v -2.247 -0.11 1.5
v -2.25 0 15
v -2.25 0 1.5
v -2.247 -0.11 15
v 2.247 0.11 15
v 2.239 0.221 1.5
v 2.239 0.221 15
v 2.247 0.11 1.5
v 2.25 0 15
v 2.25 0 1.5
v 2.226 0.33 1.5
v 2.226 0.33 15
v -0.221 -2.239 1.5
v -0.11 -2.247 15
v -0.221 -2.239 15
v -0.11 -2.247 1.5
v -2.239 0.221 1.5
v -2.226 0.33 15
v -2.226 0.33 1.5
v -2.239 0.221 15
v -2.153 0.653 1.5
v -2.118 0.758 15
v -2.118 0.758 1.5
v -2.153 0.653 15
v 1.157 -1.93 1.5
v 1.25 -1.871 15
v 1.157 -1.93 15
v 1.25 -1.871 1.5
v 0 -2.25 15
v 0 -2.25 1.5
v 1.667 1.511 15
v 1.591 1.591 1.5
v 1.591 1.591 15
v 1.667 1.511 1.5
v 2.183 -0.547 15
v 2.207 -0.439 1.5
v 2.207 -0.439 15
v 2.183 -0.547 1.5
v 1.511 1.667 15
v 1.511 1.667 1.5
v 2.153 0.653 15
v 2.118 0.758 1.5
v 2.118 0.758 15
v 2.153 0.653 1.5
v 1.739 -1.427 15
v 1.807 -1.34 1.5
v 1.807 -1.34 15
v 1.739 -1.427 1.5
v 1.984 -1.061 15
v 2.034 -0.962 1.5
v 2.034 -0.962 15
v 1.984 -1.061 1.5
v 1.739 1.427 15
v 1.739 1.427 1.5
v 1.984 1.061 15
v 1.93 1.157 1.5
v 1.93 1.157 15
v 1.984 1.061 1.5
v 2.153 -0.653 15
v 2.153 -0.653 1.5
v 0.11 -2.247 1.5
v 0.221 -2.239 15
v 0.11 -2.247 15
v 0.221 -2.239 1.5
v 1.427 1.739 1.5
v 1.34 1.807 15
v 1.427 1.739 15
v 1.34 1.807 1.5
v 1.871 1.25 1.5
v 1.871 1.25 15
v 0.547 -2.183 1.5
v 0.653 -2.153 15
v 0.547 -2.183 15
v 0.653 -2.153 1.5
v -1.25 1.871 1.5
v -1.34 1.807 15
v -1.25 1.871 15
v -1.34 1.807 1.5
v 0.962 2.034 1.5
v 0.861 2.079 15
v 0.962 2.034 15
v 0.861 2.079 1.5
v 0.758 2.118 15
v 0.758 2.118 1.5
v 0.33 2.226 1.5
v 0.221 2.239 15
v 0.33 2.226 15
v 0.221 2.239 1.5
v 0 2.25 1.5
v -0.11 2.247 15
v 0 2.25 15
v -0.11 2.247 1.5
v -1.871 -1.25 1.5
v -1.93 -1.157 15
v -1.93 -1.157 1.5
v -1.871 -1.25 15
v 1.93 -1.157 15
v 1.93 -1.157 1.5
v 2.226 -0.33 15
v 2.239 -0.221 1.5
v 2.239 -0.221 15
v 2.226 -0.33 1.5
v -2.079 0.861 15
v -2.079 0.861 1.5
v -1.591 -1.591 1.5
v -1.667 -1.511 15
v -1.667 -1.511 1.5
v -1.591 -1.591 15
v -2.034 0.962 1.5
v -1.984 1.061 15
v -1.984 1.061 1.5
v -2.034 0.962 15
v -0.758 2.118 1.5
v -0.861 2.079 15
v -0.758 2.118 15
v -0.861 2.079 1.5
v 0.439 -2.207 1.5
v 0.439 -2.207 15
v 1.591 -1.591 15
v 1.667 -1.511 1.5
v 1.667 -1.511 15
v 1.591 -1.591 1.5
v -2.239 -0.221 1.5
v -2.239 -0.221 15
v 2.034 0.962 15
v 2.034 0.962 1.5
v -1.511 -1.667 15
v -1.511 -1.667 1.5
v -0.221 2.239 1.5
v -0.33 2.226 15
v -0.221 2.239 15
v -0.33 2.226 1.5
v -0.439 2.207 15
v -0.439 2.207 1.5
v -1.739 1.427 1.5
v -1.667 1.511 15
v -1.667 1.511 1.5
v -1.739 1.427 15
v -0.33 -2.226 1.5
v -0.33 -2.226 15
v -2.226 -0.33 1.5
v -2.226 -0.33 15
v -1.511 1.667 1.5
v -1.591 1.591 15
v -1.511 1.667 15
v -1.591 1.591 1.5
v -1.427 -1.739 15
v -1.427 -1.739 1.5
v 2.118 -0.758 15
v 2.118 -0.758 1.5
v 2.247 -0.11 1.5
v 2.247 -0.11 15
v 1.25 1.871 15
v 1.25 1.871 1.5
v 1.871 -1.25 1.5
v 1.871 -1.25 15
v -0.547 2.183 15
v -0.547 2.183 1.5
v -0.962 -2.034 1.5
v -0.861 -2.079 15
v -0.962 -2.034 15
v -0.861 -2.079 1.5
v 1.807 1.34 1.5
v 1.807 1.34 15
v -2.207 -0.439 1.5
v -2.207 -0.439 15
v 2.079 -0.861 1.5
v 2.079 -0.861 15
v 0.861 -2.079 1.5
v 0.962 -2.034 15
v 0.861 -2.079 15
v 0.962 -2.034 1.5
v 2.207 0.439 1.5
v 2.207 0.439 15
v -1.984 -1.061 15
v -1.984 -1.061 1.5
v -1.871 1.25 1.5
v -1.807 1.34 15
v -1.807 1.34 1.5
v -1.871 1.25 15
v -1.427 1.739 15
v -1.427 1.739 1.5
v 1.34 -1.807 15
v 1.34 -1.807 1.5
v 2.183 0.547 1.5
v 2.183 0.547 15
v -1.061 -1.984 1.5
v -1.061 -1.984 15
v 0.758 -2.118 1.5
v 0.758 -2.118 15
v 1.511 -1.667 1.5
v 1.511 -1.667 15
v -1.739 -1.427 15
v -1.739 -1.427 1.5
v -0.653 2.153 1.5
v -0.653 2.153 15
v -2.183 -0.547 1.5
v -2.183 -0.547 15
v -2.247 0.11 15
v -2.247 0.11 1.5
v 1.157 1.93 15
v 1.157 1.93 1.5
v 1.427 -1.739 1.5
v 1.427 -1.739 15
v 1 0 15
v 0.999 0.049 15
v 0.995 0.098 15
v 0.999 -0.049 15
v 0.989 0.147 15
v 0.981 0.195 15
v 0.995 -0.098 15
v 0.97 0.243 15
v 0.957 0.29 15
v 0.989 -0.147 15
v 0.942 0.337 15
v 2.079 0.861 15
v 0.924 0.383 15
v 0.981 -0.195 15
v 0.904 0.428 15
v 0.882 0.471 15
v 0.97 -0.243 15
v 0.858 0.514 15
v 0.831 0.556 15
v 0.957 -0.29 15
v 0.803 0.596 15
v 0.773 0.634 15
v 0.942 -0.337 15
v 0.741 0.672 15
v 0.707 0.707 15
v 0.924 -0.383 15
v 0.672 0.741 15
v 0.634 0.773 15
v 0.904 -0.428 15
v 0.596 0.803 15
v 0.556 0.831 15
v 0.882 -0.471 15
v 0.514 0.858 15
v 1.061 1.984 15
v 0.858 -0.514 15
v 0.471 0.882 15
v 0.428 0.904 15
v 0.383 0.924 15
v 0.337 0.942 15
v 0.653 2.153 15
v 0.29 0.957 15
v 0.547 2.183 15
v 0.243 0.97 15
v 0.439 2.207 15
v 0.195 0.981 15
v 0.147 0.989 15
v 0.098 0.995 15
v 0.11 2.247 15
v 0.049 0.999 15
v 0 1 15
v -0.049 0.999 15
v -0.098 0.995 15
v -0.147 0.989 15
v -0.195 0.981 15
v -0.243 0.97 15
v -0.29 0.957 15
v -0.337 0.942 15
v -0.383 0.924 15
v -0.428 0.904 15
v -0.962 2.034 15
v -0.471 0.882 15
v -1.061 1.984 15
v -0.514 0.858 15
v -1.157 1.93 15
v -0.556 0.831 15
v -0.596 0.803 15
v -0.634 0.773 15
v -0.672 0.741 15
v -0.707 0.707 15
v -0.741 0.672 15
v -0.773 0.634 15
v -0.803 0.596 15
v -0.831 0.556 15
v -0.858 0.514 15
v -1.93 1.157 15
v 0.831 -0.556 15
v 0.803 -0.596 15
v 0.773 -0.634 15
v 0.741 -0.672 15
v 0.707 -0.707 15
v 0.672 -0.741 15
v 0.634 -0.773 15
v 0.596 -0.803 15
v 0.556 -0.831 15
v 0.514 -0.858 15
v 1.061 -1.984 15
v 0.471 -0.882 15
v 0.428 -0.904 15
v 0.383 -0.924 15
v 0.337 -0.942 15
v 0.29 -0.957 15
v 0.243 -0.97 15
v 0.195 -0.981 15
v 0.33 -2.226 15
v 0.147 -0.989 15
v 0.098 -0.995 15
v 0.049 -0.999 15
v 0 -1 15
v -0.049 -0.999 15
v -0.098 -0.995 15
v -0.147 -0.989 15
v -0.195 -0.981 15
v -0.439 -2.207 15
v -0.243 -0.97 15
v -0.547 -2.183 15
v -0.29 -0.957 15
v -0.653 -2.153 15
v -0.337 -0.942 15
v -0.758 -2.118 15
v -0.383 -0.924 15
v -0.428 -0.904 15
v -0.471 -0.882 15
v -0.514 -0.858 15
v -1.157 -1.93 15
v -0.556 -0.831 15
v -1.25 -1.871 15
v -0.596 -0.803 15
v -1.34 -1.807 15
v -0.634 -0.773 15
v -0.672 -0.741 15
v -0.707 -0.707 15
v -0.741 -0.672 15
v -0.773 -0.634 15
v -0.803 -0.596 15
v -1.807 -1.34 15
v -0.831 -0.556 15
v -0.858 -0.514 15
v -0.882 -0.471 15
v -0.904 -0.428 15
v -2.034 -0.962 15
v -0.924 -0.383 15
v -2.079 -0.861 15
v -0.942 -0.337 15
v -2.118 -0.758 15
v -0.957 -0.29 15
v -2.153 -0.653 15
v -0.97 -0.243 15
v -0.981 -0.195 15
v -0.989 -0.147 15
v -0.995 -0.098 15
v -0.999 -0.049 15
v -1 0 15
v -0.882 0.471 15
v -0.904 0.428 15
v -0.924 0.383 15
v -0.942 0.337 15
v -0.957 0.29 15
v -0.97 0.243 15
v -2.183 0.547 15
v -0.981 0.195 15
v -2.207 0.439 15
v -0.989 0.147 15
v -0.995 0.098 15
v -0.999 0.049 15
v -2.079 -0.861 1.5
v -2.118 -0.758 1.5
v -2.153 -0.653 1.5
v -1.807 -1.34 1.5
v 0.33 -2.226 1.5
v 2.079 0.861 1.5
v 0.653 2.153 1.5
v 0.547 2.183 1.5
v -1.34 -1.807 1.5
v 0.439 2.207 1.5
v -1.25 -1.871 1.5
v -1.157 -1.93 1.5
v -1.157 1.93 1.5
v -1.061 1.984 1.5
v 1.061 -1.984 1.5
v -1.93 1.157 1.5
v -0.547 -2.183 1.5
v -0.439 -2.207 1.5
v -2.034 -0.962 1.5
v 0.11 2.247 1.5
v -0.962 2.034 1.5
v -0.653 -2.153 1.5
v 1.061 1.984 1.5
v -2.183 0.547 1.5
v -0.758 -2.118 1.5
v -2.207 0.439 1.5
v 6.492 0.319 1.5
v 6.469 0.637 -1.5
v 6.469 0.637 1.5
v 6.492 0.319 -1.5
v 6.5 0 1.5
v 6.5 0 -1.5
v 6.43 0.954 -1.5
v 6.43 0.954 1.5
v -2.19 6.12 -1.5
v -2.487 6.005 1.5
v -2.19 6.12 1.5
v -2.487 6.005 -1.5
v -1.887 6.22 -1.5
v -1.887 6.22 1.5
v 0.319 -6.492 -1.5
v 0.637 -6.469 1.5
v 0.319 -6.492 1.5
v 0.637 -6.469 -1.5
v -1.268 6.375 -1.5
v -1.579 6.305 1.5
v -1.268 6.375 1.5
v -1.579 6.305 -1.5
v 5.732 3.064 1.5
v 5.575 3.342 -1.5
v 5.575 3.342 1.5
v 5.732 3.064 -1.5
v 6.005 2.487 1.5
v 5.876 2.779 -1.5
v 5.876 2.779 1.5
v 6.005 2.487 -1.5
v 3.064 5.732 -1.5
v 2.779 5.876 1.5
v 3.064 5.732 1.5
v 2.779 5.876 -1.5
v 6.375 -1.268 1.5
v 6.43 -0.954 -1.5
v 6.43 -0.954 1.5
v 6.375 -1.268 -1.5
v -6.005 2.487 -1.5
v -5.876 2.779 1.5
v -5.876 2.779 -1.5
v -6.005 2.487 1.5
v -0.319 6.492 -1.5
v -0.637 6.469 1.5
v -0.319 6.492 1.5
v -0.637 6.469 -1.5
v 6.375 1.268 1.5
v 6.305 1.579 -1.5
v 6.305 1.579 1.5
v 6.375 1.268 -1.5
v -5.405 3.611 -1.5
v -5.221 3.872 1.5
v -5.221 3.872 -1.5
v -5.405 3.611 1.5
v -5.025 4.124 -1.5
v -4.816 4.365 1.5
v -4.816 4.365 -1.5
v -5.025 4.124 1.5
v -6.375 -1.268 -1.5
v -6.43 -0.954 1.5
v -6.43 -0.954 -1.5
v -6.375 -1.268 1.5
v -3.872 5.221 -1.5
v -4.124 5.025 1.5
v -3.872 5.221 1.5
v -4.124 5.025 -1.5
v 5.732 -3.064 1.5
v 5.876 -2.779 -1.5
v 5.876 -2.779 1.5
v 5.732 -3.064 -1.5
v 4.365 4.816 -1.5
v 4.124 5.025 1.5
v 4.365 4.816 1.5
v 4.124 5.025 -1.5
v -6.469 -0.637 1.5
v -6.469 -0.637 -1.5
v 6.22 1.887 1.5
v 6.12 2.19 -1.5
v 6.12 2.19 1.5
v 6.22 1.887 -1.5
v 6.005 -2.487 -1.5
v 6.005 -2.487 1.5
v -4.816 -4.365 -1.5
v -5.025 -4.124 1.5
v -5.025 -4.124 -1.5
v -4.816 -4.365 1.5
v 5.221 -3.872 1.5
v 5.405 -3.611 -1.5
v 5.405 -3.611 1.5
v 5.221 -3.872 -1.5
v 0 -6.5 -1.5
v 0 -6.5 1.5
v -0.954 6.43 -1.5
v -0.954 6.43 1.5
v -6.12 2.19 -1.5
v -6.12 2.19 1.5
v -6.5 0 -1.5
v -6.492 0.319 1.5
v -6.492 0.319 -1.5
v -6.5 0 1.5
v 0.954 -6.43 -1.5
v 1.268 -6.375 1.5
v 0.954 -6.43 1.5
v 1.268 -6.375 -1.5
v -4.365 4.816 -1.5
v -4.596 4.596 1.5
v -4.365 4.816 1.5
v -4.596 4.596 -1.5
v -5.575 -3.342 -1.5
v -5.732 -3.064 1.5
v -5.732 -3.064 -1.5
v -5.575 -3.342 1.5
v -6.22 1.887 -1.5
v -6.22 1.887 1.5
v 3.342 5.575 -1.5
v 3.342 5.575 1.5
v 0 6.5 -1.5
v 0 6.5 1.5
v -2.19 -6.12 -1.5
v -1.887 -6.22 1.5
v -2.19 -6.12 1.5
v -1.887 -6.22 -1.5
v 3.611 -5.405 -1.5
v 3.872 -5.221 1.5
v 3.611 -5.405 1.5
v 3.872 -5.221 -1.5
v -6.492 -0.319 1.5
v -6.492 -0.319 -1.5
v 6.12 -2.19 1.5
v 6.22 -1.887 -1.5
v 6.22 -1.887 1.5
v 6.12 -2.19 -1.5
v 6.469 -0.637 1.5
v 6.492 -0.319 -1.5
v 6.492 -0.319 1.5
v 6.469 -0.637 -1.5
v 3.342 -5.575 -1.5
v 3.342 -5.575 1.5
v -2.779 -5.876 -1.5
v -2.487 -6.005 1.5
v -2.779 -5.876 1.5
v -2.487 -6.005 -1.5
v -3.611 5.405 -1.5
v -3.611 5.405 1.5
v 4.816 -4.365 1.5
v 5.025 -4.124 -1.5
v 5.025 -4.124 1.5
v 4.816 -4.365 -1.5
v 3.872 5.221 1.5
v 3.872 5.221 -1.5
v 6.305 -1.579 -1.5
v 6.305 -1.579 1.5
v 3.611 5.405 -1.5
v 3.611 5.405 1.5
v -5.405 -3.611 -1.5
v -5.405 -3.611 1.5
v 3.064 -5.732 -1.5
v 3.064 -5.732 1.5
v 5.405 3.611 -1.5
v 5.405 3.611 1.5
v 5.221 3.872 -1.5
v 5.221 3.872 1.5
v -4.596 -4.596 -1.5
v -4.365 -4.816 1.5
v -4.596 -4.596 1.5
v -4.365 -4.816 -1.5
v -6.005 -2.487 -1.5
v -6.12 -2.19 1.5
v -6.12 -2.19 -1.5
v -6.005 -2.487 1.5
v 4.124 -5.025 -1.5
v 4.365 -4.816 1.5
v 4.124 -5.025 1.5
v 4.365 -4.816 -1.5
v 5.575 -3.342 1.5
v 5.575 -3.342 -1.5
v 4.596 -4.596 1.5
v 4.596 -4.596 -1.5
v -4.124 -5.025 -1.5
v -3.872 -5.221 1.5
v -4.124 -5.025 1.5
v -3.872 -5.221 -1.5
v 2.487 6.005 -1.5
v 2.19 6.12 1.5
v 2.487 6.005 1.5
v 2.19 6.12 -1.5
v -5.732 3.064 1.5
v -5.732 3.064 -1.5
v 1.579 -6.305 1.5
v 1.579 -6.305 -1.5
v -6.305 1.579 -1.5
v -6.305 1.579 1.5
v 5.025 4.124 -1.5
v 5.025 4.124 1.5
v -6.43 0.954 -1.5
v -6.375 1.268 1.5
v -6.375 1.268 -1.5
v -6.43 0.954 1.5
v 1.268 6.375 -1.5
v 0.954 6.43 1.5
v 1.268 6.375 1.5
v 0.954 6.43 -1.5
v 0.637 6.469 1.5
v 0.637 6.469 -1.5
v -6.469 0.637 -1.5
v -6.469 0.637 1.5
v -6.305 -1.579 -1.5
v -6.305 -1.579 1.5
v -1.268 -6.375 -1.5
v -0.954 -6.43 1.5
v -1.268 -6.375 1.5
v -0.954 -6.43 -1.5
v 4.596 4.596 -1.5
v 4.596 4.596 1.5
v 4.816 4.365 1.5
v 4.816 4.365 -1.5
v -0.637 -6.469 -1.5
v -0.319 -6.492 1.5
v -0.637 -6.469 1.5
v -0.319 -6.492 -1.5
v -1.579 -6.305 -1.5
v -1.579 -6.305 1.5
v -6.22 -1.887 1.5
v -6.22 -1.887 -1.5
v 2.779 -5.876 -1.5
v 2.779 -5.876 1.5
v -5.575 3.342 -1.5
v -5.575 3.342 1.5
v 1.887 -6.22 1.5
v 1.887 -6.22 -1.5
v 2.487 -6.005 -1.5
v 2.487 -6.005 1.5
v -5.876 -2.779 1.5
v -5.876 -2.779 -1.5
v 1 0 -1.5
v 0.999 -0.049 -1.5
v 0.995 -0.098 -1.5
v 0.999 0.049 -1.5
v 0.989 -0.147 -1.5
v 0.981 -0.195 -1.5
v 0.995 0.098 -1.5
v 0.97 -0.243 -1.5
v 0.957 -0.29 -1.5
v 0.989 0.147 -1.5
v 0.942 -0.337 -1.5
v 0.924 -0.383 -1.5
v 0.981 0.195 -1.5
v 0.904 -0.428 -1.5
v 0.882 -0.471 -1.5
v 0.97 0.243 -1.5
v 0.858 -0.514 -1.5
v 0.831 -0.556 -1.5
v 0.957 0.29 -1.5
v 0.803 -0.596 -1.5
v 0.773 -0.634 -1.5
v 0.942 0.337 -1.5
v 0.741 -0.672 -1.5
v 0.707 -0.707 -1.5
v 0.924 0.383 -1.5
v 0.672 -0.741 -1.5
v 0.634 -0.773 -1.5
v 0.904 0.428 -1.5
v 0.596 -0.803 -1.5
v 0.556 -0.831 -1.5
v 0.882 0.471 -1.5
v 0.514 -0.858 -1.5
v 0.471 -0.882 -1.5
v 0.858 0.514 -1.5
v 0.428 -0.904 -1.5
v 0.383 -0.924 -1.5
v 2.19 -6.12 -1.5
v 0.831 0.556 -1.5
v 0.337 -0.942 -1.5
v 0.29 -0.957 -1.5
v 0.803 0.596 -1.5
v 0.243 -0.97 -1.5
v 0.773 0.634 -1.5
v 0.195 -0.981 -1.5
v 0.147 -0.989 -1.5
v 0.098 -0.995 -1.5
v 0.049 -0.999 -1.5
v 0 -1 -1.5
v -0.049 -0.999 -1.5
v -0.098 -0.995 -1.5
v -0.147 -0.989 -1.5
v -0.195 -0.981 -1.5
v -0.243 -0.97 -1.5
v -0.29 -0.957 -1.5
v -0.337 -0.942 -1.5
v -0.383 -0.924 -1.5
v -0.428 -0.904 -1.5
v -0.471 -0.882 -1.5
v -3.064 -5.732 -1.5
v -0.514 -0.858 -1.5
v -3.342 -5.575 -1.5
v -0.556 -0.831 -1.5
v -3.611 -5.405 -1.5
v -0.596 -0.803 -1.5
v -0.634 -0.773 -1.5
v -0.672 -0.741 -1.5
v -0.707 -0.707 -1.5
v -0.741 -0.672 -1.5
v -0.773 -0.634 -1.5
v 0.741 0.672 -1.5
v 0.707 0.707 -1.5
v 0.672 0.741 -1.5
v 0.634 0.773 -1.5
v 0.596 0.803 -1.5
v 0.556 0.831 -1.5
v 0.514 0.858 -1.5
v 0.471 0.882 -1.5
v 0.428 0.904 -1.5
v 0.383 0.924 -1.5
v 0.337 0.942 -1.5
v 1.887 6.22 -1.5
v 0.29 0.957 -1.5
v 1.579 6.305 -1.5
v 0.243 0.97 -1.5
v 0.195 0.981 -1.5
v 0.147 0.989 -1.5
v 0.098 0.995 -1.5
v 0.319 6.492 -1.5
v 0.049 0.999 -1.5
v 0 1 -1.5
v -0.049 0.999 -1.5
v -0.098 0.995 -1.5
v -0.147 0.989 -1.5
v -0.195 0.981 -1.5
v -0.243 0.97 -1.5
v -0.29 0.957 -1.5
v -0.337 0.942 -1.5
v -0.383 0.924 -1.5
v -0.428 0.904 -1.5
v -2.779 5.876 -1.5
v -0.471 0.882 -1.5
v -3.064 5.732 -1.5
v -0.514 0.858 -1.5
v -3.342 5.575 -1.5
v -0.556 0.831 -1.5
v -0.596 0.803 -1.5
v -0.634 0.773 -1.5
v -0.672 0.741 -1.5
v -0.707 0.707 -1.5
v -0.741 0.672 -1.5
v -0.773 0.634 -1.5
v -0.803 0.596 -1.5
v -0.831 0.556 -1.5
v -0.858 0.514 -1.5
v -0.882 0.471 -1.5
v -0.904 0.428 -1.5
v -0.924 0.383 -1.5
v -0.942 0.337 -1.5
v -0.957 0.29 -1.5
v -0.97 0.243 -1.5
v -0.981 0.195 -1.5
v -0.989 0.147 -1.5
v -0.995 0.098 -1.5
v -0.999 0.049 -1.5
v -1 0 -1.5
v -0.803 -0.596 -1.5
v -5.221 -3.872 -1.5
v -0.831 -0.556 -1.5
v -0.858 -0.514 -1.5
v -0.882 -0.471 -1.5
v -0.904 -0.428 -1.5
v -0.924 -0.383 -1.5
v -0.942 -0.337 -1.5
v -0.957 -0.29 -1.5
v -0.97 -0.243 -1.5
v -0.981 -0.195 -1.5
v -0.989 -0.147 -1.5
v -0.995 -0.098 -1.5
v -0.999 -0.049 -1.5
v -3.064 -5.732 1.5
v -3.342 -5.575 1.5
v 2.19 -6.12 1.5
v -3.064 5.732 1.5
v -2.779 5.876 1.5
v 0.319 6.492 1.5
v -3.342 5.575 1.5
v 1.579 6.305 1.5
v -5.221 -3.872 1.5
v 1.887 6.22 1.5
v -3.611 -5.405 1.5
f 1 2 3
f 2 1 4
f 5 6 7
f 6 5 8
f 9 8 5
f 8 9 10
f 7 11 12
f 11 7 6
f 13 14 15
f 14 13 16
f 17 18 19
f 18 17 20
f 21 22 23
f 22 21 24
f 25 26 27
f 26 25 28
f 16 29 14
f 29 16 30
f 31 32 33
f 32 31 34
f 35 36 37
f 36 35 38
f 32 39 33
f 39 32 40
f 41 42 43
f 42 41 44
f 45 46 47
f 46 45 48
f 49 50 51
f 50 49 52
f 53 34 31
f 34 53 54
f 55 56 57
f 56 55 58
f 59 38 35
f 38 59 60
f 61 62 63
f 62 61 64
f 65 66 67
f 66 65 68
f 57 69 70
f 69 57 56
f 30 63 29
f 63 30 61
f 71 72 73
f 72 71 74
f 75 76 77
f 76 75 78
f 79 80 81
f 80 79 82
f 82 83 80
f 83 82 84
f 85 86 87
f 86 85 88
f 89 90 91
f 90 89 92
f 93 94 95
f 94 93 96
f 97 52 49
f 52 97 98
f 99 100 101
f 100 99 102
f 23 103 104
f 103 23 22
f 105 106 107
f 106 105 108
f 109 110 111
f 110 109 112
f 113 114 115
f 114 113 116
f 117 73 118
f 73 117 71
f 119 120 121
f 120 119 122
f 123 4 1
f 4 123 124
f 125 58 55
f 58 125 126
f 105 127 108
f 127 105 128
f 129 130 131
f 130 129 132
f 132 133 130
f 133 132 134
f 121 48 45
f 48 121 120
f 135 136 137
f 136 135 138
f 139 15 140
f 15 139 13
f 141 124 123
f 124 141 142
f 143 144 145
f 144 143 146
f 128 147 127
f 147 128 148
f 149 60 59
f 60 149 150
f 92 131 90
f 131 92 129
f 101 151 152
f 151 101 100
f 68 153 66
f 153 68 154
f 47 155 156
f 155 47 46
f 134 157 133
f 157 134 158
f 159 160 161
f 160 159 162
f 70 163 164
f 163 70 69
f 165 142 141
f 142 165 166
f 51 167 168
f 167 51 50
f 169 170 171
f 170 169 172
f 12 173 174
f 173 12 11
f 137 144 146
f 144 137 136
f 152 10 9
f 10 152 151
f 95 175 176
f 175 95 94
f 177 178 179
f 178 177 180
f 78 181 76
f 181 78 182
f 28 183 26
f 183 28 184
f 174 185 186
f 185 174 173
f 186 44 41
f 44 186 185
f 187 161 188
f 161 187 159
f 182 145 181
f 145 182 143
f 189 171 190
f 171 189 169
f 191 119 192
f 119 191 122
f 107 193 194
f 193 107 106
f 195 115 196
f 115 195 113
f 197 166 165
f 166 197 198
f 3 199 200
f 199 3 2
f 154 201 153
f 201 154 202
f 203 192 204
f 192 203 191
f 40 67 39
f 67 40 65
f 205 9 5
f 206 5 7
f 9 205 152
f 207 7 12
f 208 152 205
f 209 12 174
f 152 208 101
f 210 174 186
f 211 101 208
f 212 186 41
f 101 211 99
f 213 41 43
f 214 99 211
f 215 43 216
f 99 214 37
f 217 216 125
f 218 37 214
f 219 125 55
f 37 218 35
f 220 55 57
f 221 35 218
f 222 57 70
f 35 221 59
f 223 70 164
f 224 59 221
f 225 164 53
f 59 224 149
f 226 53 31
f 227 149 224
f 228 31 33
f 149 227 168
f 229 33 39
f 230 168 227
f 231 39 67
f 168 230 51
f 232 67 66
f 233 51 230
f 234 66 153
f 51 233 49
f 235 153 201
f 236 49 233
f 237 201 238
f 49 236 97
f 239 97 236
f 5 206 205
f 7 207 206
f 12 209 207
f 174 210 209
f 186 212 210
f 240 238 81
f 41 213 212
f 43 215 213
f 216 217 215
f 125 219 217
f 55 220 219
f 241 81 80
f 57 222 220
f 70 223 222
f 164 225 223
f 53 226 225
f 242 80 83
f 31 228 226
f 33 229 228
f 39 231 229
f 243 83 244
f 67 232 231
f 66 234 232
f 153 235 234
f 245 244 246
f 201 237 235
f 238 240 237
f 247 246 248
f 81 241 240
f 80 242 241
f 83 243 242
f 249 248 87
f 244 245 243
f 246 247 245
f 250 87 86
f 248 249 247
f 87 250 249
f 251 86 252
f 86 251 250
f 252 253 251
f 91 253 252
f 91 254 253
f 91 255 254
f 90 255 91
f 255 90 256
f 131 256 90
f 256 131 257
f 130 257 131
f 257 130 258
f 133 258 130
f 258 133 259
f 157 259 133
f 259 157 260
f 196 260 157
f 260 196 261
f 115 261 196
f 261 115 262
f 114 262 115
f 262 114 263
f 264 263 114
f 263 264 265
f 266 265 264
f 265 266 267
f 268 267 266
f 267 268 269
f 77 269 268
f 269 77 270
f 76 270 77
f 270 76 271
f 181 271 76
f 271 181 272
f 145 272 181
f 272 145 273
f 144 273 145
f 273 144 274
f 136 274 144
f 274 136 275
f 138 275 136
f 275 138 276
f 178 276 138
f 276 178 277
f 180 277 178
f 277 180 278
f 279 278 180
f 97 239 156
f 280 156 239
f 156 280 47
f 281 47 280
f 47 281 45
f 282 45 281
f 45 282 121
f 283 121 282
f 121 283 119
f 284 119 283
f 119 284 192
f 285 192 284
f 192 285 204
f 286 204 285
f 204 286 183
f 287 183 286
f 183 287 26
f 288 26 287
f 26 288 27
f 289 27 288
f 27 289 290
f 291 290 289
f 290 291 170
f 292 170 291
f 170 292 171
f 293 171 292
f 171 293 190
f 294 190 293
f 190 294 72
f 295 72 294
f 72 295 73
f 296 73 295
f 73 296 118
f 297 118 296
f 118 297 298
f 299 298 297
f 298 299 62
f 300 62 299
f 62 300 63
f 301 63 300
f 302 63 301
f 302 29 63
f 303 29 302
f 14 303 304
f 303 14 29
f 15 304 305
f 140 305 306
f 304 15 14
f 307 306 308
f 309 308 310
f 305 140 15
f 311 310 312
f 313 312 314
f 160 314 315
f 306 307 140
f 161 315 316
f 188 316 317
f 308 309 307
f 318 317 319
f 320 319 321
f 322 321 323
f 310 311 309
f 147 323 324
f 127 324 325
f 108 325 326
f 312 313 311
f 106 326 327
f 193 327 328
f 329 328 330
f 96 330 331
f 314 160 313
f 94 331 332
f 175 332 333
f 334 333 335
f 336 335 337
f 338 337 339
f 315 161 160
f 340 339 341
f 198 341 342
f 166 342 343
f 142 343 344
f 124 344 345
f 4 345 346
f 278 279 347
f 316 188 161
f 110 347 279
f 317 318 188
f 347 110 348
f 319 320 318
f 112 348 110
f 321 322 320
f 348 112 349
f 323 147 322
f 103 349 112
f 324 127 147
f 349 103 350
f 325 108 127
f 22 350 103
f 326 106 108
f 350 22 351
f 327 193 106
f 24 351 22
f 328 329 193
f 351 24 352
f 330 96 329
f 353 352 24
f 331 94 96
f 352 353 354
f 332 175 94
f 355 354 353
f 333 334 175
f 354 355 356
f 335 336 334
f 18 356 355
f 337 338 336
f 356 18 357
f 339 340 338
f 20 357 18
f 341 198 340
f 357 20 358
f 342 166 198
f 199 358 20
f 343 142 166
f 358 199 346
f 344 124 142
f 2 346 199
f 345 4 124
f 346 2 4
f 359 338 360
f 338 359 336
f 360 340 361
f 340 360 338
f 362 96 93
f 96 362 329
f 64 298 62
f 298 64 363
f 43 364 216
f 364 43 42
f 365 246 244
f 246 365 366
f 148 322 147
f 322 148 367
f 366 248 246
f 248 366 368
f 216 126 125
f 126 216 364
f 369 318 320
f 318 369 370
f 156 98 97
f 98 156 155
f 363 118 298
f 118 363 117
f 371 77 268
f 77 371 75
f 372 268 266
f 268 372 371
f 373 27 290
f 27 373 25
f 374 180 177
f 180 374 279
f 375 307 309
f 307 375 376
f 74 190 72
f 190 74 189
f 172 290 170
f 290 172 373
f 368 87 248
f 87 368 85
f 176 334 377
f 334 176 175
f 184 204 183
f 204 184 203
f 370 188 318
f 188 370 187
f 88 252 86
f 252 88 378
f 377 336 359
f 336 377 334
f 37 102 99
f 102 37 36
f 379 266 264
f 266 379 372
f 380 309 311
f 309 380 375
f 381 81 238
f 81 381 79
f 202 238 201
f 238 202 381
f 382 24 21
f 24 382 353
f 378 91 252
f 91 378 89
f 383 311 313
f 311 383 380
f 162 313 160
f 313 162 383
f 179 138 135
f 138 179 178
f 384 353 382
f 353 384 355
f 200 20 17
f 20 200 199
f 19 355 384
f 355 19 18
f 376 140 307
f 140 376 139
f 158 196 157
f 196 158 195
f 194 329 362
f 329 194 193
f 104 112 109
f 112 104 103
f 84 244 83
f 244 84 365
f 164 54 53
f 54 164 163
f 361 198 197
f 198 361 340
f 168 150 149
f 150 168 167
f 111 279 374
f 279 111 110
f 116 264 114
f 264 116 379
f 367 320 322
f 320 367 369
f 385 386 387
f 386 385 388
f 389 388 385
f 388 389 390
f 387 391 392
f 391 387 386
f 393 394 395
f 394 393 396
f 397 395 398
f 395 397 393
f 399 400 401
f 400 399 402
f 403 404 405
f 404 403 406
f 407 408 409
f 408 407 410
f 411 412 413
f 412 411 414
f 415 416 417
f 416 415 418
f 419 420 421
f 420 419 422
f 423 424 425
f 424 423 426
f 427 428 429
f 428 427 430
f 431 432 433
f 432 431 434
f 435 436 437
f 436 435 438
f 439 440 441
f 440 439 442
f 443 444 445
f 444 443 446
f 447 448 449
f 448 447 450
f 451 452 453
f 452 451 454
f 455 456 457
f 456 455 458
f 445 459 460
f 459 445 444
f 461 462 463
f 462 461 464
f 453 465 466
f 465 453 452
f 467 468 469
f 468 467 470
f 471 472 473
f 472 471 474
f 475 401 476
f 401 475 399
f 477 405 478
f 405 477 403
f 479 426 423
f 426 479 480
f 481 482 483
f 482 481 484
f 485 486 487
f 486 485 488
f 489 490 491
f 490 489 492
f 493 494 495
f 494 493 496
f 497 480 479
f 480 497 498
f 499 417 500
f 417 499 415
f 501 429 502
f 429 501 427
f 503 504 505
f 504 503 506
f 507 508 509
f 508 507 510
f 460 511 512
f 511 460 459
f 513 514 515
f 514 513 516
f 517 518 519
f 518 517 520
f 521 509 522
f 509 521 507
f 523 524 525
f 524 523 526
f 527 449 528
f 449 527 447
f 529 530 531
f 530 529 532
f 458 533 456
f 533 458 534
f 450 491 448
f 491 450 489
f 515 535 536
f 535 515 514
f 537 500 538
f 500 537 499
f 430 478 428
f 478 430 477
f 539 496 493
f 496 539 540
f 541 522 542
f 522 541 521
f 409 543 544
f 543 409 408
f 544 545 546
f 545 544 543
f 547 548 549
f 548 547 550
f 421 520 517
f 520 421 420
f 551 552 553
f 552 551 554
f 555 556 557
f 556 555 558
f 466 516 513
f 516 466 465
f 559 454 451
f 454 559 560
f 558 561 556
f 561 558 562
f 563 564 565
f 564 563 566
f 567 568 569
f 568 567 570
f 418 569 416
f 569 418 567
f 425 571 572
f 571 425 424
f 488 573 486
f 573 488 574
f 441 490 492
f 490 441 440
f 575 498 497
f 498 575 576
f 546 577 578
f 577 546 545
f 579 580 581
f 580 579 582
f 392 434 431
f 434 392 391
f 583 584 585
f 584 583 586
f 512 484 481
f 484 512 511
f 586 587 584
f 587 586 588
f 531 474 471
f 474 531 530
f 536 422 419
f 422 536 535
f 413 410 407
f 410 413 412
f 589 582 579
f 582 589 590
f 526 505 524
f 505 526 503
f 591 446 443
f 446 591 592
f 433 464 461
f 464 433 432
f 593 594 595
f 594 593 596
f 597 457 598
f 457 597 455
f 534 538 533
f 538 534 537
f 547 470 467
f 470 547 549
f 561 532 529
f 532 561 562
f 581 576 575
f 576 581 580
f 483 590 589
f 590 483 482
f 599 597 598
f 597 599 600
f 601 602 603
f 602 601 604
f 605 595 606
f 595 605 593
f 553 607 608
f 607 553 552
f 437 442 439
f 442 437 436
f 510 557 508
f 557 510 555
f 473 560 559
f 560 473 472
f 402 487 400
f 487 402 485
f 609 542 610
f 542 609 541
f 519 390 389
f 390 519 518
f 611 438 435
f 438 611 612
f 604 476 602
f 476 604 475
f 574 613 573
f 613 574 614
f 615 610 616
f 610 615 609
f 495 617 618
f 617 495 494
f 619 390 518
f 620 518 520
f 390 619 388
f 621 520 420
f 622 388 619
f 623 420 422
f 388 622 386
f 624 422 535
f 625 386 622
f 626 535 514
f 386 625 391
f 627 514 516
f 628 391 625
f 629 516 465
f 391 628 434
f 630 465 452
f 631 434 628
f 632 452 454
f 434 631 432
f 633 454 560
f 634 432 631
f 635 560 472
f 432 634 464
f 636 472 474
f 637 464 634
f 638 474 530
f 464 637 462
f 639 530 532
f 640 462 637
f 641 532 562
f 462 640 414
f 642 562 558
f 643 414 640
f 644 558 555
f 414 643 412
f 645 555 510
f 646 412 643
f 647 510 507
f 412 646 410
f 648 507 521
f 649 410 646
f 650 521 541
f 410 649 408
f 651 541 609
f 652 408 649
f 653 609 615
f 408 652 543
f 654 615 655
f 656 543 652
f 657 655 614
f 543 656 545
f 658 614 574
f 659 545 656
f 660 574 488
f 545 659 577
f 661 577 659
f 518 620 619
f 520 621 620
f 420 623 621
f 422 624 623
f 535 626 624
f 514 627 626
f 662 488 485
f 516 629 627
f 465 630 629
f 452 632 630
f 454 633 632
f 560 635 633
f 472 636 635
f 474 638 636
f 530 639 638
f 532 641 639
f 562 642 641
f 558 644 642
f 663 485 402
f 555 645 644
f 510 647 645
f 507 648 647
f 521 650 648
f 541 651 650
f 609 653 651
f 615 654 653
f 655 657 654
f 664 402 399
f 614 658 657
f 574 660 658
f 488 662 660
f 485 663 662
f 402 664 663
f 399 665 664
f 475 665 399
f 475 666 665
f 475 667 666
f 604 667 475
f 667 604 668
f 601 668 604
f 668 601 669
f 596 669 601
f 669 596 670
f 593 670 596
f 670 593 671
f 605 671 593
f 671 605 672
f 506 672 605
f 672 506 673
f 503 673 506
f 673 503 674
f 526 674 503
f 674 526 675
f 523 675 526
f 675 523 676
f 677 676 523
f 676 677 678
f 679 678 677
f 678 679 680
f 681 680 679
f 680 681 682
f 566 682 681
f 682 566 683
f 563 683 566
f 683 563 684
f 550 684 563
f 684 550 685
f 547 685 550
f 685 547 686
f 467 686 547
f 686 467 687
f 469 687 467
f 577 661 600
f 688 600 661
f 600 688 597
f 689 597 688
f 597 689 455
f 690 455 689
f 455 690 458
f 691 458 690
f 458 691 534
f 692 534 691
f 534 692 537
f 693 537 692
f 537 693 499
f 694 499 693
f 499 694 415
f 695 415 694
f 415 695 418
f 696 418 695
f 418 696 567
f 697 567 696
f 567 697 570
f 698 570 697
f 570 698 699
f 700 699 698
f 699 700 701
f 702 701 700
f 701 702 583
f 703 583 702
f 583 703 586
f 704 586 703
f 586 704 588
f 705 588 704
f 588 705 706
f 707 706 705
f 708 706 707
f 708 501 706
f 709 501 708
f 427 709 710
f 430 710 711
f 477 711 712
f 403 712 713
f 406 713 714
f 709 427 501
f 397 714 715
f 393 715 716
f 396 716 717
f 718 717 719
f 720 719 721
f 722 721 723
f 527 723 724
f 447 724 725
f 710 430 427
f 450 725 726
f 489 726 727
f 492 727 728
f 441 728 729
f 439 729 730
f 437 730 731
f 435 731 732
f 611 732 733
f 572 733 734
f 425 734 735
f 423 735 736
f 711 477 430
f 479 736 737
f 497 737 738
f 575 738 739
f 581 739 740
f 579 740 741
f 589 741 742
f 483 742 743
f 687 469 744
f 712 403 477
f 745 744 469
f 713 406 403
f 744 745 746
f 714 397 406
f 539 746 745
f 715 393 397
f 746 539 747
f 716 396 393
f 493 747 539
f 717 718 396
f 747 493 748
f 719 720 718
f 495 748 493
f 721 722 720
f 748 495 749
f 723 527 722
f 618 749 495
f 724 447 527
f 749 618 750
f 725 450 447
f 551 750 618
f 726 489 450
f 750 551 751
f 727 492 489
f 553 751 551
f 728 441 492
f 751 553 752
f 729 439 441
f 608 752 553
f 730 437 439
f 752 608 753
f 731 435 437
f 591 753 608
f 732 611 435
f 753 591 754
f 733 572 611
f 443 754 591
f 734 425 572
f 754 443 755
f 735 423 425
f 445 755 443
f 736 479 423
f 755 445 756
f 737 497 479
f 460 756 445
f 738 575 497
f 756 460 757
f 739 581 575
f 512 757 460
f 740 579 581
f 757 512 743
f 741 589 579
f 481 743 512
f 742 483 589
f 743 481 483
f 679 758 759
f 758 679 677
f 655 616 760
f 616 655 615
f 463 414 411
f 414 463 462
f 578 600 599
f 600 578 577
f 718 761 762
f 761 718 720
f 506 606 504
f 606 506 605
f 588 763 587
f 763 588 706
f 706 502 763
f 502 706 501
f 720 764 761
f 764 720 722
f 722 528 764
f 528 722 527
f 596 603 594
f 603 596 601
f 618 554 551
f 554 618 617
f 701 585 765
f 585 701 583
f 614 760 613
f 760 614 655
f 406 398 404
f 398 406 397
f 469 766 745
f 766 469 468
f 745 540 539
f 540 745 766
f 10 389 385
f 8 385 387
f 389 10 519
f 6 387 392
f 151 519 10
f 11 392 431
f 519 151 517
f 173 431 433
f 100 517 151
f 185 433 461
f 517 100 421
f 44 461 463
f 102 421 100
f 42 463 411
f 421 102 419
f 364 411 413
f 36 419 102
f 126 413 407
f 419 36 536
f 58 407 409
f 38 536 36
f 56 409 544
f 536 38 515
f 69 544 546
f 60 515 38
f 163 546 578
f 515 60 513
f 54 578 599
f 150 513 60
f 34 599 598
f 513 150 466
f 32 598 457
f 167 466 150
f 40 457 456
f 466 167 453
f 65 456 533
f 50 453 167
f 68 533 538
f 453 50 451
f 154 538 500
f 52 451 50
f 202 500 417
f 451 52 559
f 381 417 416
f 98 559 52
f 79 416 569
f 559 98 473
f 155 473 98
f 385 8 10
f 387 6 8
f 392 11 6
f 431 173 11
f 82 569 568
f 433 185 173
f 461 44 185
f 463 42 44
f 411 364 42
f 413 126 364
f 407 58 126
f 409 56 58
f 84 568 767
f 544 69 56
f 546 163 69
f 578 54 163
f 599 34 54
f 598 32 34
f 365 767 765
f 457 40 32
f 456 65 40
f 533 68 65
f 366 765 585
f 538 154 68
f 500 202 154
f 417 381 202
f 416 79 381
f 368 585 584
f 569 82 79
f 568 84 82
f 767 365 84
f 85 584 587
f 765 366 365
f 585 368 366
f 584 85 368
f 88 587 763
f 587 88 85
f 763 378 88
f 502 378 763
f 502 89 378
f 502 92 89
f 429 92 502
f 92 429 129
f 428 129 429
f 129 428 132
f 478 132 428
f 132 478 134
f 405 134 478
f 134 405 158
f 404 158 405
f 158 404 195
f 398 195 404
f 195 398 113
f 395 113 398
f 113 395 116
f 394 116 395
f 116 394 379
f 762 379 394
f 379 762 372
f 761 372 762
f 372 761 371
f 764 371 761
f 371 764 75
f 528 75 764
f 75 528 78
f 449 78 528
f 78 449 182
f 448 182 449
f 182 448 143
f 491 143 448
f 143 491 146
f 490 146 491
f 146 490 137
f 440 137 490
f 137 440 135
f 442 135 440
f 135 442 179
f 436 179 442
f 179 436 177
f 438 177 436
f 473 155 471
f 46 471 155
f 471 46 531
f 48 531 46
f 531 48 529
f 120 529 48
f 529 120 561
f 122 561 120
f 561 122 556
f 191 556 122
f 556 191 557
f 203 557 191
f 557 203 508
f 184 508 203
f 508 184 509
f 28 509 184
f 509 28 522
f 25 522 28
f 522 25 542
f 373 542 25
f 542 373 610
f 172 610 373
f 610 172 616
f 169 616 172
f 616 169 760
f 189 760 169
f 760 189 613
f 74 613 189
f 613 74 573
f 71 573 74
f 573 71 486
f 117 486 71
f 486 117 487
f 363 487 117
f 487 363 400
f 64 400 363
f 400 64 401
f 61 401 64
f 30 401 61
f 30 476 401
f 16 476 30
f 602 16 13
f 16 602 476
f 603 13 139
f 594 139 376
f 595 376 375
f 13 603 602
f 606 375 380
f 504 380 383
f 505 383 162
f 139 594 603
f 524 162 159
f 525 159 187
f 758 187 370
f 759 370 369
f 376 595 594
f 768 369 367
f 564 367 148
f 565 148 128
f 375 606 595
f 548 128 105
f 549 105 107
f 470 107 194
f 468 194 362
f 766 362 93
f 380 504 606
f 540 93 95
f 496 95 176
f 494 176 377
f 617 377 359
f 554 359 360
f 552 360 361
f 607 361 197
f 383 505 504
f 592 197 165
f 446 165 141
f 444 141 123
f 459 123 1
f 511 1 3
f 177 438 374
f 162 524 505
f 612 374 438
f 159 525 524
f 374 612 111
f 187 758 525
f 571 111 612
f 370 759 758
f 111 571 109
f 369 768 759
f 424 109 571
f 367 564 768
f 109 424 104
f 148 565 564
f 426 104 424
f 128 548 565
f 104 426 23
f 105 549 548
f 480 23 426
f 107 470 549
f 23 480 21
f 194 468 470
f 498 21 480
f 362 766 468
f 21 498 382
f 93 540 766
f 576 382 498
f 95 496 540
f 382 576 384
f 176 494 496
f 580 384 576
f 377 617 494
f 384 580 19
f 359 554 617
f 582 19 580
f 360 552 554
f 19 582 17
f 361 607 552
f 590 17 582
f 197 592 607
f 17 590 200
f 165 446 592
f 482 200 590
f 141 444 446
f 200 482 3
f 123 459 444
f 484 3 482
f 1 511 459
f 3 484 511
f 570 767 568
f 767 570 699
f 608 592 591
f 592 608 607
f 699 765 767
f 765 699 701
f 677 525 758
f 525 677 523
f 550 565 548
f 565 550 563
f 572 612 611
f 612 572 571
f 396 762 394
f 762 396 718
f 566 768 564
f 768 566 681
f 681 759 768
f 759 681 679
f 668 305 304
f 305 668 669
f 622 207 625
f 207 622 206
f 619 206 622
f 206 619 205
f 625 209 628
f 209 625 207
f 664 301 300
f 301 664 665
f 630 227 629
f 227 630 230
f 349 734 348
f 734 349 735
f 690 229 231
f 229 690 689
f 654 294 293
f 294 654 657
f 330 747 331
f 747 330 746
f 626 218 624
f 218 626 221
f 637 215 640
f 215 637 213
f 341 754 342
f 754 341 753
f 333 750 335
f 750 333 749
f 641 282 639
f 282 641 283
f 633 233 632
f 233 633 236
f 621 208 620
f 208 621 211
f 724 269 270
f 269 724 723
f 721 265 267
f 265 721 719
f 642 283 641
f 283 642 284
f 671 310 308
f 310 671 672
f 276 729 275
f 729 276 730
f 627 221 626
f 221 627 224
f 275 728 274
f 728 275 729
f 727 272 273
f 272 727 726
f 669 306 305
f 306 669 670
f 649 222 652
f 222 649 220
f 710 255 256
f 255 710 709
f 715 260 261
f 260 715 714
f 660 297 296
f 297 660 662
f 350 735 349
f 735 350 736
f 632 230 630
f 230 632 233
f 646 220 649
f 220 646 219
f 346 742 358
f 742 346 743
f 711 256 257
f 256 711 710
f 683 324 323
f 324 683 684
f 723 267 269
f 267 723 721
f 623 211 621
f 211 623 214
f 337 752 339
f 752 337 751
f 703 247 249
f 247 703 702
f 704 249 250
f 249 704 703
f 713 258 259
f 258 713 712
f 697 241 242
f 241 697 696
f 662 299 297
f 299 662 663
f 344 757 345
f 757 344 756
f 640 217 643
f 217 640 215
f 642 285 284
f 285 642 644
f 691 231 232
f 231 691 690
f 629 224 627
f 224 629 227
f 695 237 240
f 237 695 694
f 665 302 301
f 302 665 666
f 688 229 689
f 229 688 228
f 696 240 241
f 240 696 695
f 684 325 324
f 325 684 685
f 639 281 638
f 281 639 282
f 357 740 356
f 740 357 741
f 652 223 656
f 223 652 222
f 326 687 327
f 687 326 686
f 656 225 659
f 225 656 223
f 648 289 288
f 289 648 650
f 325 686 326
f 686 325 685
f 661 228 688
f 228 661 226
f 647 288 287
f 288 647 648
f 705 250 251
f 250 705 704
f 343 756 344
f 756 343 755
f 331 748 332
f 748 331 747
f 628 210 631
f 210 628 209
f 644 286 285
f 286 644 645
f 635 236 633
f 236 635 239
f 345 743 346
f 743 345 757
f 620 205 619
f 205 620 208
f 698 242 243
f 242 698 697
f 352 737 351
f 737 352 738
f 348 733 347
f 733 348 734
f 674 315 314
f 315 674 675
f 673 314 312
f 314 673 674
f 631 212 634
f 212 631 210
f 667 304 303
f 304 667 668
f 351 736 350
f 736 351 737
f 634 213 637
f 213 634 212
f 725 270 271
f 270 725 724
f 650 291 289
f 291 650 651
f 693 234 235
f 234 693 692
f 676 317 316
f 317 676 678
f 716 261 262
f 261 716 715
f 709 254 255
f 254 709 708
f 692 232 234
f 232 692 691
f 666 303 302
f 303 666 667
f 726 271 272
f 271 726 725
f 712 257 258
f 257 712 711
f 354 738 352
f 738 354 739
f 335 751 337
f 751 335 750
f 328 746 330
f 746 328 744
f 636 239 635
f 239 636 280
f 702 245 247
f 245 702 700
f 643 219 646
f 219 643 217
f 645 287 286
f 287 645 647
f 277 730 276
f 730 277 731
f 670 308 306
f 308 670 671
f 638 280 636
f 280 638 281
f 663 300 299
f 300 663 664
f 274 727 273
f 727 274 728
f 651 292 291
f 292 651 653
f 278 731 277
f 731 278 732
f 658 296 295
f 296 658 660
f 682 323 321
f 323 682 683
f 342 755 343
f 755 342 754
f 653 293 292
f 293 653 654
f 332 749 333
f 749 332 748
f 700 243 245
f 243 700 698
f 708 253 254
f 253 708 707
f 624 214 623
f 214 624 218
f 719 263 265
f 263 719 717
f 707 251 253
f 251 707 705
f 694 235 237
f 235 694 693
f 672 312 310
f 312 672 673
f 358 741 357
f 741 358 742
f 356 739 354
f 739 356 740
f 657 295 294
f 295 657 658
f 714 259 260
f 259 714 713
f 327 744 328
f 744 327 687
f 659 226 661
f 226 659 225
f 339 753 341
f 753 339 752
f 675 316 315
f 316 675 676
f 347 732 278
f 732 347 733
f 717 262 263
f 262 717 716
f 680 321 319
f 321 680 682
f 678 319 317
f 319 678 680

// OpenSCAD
$fn=128;

difference(){
union(){
cylinder(d=4.5,h=15);

cylinder(d=13,h=3,center=true);
}
translate([0,0,-10])
cylinder(d=2,h=50);

}
